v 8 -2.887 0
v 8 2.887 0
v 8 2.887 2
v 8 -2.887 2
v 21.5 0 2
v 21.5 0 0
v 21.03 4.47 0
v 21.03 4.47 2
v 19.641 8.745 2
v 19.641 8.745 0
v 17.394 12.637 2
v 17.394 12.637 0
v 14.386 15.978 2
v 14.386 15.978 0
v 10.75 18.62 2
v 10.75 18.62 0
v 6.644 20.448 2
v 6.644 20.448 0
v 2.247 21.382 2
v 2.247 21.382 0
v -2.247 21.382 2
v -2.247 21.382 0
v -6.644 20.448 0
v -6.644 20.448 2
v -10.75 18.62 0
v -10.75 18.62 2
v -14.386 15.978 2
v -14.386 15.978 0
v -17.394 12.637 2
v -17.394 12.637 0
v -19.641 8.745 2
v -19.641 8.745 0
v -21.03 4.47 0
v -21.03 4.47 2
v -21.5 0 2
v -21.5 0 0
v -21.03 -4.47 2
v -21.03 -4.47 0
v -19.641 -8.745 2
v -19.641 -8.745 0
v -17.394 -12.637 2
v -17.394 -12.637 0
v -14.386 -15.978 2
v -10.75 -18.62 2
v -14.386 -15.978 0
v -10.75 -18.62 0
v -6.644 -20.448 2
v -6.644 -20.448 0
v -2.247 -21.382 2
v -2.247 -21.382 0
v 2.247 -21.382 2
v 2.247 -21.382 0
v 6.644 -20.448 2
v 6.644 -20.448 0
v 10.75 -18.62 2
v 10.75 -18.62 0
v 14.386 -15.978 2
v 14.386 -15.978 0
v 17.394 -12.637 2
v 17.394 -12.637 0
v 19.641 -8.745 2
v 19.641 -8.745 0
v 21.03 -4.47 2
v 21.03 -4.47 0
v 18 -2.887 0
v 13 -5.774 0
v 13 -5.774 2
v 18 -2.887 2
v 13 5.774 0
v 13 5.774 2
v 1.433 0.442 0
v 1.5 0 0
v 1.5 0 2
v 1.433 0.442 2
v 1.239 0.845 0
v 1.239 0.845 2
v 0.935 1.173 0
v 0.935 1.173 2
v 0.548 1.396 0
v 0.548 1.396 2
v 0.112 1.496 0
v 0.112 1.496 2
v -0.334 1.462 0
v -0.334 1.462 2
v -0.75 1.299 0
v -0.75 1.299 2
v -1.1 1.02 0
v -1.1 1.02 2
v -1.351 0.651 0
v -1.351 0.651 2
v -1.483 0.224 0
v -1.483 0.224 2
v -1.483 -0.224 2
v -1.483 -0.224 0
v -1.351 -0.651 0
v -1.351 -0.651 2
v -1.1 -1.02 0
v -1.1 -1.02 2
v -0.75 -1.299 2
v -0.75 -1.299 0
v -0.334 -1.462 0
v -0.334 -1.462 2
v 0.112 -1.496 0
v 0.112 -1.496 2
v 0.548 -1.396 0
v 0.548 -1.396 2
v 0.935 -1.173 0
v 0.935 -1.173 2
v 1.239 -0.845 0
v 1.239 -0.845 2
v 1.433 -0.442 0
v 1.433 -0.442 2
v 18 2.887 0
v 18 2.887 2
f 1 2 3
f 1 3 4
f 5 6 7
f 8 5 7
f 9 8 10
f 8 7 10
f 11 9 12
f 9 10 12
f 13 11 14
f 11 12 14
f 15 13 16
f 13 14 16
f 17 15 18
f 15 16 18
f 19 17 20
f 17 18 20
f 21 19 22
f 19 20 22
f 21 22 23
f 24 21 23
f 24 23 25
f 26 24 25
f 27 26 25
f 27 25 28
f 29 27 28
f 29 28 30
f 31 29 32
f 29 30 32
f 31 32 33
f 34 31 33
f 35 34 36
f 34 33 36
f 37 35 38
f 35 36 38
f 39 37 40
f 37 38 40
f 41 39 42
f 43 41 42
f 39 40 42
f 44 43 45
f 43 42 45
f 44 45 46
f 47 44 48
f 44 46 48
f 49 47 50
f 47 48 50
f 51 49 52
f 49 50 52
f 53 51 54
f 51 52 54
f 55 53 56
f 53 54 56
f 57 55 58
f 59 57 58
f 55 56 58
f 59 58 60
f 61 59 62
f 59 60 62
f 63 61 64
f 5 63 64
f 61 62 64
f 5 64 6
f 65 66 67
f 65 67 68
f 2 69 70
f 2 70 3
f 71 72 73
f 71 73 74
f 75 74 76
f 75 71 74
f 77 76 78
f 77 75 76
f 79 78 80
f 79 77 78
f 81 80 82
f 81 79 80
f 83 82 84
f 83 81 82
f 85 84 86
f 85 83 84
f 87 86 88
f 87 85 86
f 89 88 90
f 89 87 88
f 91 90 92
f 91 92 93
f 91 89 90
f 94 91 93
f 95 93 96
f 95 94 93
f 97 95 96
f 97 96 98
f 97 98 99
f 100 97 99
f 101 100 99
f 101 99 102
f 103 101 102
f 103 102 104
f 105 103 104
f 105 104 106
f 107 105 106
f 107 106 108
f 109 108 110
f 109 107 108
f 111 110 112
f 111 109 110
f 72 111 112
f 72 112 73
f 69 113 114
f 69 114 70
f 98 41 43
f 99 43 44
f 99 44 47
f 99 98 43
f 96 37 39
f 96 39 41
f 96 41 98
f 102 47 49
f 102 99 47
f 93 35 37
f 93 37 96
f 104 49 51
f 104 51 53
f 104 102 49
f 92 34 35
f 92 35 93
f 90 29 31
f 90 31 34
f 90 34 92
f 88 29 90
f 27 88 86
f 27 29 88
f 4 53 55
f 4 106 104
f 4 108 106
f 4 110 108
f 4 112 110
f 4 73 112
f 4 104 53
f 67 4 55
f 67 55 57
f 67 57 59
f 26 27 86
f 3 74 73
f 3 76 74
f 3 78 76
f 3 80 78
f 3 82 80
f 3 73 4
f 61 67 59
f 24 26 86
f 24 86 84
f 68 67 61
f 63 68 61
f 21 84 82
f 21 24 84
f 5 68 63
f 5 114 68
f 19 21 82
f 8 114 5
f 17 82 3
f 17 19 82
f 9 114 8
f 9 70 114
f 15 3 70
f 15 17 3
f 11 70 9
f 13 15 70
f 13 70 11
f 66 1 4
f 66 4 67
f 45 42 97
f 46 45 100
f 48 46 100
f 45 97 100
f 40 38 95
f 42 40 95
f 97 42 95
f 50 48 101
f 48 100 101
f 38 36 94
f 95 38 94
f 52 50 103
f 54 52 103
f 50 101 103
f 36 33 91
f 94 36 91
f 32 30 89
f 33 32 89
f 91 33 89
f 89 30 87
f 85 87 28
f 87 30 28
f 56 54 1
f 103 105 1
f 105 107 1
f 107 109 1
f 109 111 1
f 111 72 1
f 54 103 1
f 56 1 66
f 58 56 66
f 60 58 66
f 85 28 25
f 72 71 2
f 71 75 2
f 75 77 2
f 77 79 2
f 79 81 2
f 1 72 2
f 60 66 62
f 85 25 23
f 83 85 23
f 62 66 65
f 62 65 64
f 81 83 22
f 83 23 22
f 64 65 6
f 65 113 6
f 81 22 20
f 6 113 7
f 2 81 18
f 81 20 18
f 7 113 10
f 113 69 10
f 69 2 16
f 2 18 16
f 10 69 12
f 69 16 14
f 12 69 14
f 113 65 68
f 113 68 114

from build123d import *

# Parameters (mm, degrees)
SKETCH1_R           = 21.5
SKETCH1_R_2         = 1.5
BOSS_EXTRUDE1_DEPTH = 2


with BuildPart() as part:
    # Sketch1 → Boss-Extrude1 (new body)
    with BuildSketch(Plane.XY):
        Circle(SKETCH1_R)
        Circle(SKETCH1_R_2, mode=Mode.SUBTRACT)
        Polygon((18, 2.886751346), (13, 5.773502692), (8, 2.886751346), (8, -2.886751346), (13, -5.773502692), (18, -2.886751346), align=None, mode=Mode.SUBTRACT)
    extrude(amount=BOSS_EXTRUDE1_DEPTH)


solid = part.part
